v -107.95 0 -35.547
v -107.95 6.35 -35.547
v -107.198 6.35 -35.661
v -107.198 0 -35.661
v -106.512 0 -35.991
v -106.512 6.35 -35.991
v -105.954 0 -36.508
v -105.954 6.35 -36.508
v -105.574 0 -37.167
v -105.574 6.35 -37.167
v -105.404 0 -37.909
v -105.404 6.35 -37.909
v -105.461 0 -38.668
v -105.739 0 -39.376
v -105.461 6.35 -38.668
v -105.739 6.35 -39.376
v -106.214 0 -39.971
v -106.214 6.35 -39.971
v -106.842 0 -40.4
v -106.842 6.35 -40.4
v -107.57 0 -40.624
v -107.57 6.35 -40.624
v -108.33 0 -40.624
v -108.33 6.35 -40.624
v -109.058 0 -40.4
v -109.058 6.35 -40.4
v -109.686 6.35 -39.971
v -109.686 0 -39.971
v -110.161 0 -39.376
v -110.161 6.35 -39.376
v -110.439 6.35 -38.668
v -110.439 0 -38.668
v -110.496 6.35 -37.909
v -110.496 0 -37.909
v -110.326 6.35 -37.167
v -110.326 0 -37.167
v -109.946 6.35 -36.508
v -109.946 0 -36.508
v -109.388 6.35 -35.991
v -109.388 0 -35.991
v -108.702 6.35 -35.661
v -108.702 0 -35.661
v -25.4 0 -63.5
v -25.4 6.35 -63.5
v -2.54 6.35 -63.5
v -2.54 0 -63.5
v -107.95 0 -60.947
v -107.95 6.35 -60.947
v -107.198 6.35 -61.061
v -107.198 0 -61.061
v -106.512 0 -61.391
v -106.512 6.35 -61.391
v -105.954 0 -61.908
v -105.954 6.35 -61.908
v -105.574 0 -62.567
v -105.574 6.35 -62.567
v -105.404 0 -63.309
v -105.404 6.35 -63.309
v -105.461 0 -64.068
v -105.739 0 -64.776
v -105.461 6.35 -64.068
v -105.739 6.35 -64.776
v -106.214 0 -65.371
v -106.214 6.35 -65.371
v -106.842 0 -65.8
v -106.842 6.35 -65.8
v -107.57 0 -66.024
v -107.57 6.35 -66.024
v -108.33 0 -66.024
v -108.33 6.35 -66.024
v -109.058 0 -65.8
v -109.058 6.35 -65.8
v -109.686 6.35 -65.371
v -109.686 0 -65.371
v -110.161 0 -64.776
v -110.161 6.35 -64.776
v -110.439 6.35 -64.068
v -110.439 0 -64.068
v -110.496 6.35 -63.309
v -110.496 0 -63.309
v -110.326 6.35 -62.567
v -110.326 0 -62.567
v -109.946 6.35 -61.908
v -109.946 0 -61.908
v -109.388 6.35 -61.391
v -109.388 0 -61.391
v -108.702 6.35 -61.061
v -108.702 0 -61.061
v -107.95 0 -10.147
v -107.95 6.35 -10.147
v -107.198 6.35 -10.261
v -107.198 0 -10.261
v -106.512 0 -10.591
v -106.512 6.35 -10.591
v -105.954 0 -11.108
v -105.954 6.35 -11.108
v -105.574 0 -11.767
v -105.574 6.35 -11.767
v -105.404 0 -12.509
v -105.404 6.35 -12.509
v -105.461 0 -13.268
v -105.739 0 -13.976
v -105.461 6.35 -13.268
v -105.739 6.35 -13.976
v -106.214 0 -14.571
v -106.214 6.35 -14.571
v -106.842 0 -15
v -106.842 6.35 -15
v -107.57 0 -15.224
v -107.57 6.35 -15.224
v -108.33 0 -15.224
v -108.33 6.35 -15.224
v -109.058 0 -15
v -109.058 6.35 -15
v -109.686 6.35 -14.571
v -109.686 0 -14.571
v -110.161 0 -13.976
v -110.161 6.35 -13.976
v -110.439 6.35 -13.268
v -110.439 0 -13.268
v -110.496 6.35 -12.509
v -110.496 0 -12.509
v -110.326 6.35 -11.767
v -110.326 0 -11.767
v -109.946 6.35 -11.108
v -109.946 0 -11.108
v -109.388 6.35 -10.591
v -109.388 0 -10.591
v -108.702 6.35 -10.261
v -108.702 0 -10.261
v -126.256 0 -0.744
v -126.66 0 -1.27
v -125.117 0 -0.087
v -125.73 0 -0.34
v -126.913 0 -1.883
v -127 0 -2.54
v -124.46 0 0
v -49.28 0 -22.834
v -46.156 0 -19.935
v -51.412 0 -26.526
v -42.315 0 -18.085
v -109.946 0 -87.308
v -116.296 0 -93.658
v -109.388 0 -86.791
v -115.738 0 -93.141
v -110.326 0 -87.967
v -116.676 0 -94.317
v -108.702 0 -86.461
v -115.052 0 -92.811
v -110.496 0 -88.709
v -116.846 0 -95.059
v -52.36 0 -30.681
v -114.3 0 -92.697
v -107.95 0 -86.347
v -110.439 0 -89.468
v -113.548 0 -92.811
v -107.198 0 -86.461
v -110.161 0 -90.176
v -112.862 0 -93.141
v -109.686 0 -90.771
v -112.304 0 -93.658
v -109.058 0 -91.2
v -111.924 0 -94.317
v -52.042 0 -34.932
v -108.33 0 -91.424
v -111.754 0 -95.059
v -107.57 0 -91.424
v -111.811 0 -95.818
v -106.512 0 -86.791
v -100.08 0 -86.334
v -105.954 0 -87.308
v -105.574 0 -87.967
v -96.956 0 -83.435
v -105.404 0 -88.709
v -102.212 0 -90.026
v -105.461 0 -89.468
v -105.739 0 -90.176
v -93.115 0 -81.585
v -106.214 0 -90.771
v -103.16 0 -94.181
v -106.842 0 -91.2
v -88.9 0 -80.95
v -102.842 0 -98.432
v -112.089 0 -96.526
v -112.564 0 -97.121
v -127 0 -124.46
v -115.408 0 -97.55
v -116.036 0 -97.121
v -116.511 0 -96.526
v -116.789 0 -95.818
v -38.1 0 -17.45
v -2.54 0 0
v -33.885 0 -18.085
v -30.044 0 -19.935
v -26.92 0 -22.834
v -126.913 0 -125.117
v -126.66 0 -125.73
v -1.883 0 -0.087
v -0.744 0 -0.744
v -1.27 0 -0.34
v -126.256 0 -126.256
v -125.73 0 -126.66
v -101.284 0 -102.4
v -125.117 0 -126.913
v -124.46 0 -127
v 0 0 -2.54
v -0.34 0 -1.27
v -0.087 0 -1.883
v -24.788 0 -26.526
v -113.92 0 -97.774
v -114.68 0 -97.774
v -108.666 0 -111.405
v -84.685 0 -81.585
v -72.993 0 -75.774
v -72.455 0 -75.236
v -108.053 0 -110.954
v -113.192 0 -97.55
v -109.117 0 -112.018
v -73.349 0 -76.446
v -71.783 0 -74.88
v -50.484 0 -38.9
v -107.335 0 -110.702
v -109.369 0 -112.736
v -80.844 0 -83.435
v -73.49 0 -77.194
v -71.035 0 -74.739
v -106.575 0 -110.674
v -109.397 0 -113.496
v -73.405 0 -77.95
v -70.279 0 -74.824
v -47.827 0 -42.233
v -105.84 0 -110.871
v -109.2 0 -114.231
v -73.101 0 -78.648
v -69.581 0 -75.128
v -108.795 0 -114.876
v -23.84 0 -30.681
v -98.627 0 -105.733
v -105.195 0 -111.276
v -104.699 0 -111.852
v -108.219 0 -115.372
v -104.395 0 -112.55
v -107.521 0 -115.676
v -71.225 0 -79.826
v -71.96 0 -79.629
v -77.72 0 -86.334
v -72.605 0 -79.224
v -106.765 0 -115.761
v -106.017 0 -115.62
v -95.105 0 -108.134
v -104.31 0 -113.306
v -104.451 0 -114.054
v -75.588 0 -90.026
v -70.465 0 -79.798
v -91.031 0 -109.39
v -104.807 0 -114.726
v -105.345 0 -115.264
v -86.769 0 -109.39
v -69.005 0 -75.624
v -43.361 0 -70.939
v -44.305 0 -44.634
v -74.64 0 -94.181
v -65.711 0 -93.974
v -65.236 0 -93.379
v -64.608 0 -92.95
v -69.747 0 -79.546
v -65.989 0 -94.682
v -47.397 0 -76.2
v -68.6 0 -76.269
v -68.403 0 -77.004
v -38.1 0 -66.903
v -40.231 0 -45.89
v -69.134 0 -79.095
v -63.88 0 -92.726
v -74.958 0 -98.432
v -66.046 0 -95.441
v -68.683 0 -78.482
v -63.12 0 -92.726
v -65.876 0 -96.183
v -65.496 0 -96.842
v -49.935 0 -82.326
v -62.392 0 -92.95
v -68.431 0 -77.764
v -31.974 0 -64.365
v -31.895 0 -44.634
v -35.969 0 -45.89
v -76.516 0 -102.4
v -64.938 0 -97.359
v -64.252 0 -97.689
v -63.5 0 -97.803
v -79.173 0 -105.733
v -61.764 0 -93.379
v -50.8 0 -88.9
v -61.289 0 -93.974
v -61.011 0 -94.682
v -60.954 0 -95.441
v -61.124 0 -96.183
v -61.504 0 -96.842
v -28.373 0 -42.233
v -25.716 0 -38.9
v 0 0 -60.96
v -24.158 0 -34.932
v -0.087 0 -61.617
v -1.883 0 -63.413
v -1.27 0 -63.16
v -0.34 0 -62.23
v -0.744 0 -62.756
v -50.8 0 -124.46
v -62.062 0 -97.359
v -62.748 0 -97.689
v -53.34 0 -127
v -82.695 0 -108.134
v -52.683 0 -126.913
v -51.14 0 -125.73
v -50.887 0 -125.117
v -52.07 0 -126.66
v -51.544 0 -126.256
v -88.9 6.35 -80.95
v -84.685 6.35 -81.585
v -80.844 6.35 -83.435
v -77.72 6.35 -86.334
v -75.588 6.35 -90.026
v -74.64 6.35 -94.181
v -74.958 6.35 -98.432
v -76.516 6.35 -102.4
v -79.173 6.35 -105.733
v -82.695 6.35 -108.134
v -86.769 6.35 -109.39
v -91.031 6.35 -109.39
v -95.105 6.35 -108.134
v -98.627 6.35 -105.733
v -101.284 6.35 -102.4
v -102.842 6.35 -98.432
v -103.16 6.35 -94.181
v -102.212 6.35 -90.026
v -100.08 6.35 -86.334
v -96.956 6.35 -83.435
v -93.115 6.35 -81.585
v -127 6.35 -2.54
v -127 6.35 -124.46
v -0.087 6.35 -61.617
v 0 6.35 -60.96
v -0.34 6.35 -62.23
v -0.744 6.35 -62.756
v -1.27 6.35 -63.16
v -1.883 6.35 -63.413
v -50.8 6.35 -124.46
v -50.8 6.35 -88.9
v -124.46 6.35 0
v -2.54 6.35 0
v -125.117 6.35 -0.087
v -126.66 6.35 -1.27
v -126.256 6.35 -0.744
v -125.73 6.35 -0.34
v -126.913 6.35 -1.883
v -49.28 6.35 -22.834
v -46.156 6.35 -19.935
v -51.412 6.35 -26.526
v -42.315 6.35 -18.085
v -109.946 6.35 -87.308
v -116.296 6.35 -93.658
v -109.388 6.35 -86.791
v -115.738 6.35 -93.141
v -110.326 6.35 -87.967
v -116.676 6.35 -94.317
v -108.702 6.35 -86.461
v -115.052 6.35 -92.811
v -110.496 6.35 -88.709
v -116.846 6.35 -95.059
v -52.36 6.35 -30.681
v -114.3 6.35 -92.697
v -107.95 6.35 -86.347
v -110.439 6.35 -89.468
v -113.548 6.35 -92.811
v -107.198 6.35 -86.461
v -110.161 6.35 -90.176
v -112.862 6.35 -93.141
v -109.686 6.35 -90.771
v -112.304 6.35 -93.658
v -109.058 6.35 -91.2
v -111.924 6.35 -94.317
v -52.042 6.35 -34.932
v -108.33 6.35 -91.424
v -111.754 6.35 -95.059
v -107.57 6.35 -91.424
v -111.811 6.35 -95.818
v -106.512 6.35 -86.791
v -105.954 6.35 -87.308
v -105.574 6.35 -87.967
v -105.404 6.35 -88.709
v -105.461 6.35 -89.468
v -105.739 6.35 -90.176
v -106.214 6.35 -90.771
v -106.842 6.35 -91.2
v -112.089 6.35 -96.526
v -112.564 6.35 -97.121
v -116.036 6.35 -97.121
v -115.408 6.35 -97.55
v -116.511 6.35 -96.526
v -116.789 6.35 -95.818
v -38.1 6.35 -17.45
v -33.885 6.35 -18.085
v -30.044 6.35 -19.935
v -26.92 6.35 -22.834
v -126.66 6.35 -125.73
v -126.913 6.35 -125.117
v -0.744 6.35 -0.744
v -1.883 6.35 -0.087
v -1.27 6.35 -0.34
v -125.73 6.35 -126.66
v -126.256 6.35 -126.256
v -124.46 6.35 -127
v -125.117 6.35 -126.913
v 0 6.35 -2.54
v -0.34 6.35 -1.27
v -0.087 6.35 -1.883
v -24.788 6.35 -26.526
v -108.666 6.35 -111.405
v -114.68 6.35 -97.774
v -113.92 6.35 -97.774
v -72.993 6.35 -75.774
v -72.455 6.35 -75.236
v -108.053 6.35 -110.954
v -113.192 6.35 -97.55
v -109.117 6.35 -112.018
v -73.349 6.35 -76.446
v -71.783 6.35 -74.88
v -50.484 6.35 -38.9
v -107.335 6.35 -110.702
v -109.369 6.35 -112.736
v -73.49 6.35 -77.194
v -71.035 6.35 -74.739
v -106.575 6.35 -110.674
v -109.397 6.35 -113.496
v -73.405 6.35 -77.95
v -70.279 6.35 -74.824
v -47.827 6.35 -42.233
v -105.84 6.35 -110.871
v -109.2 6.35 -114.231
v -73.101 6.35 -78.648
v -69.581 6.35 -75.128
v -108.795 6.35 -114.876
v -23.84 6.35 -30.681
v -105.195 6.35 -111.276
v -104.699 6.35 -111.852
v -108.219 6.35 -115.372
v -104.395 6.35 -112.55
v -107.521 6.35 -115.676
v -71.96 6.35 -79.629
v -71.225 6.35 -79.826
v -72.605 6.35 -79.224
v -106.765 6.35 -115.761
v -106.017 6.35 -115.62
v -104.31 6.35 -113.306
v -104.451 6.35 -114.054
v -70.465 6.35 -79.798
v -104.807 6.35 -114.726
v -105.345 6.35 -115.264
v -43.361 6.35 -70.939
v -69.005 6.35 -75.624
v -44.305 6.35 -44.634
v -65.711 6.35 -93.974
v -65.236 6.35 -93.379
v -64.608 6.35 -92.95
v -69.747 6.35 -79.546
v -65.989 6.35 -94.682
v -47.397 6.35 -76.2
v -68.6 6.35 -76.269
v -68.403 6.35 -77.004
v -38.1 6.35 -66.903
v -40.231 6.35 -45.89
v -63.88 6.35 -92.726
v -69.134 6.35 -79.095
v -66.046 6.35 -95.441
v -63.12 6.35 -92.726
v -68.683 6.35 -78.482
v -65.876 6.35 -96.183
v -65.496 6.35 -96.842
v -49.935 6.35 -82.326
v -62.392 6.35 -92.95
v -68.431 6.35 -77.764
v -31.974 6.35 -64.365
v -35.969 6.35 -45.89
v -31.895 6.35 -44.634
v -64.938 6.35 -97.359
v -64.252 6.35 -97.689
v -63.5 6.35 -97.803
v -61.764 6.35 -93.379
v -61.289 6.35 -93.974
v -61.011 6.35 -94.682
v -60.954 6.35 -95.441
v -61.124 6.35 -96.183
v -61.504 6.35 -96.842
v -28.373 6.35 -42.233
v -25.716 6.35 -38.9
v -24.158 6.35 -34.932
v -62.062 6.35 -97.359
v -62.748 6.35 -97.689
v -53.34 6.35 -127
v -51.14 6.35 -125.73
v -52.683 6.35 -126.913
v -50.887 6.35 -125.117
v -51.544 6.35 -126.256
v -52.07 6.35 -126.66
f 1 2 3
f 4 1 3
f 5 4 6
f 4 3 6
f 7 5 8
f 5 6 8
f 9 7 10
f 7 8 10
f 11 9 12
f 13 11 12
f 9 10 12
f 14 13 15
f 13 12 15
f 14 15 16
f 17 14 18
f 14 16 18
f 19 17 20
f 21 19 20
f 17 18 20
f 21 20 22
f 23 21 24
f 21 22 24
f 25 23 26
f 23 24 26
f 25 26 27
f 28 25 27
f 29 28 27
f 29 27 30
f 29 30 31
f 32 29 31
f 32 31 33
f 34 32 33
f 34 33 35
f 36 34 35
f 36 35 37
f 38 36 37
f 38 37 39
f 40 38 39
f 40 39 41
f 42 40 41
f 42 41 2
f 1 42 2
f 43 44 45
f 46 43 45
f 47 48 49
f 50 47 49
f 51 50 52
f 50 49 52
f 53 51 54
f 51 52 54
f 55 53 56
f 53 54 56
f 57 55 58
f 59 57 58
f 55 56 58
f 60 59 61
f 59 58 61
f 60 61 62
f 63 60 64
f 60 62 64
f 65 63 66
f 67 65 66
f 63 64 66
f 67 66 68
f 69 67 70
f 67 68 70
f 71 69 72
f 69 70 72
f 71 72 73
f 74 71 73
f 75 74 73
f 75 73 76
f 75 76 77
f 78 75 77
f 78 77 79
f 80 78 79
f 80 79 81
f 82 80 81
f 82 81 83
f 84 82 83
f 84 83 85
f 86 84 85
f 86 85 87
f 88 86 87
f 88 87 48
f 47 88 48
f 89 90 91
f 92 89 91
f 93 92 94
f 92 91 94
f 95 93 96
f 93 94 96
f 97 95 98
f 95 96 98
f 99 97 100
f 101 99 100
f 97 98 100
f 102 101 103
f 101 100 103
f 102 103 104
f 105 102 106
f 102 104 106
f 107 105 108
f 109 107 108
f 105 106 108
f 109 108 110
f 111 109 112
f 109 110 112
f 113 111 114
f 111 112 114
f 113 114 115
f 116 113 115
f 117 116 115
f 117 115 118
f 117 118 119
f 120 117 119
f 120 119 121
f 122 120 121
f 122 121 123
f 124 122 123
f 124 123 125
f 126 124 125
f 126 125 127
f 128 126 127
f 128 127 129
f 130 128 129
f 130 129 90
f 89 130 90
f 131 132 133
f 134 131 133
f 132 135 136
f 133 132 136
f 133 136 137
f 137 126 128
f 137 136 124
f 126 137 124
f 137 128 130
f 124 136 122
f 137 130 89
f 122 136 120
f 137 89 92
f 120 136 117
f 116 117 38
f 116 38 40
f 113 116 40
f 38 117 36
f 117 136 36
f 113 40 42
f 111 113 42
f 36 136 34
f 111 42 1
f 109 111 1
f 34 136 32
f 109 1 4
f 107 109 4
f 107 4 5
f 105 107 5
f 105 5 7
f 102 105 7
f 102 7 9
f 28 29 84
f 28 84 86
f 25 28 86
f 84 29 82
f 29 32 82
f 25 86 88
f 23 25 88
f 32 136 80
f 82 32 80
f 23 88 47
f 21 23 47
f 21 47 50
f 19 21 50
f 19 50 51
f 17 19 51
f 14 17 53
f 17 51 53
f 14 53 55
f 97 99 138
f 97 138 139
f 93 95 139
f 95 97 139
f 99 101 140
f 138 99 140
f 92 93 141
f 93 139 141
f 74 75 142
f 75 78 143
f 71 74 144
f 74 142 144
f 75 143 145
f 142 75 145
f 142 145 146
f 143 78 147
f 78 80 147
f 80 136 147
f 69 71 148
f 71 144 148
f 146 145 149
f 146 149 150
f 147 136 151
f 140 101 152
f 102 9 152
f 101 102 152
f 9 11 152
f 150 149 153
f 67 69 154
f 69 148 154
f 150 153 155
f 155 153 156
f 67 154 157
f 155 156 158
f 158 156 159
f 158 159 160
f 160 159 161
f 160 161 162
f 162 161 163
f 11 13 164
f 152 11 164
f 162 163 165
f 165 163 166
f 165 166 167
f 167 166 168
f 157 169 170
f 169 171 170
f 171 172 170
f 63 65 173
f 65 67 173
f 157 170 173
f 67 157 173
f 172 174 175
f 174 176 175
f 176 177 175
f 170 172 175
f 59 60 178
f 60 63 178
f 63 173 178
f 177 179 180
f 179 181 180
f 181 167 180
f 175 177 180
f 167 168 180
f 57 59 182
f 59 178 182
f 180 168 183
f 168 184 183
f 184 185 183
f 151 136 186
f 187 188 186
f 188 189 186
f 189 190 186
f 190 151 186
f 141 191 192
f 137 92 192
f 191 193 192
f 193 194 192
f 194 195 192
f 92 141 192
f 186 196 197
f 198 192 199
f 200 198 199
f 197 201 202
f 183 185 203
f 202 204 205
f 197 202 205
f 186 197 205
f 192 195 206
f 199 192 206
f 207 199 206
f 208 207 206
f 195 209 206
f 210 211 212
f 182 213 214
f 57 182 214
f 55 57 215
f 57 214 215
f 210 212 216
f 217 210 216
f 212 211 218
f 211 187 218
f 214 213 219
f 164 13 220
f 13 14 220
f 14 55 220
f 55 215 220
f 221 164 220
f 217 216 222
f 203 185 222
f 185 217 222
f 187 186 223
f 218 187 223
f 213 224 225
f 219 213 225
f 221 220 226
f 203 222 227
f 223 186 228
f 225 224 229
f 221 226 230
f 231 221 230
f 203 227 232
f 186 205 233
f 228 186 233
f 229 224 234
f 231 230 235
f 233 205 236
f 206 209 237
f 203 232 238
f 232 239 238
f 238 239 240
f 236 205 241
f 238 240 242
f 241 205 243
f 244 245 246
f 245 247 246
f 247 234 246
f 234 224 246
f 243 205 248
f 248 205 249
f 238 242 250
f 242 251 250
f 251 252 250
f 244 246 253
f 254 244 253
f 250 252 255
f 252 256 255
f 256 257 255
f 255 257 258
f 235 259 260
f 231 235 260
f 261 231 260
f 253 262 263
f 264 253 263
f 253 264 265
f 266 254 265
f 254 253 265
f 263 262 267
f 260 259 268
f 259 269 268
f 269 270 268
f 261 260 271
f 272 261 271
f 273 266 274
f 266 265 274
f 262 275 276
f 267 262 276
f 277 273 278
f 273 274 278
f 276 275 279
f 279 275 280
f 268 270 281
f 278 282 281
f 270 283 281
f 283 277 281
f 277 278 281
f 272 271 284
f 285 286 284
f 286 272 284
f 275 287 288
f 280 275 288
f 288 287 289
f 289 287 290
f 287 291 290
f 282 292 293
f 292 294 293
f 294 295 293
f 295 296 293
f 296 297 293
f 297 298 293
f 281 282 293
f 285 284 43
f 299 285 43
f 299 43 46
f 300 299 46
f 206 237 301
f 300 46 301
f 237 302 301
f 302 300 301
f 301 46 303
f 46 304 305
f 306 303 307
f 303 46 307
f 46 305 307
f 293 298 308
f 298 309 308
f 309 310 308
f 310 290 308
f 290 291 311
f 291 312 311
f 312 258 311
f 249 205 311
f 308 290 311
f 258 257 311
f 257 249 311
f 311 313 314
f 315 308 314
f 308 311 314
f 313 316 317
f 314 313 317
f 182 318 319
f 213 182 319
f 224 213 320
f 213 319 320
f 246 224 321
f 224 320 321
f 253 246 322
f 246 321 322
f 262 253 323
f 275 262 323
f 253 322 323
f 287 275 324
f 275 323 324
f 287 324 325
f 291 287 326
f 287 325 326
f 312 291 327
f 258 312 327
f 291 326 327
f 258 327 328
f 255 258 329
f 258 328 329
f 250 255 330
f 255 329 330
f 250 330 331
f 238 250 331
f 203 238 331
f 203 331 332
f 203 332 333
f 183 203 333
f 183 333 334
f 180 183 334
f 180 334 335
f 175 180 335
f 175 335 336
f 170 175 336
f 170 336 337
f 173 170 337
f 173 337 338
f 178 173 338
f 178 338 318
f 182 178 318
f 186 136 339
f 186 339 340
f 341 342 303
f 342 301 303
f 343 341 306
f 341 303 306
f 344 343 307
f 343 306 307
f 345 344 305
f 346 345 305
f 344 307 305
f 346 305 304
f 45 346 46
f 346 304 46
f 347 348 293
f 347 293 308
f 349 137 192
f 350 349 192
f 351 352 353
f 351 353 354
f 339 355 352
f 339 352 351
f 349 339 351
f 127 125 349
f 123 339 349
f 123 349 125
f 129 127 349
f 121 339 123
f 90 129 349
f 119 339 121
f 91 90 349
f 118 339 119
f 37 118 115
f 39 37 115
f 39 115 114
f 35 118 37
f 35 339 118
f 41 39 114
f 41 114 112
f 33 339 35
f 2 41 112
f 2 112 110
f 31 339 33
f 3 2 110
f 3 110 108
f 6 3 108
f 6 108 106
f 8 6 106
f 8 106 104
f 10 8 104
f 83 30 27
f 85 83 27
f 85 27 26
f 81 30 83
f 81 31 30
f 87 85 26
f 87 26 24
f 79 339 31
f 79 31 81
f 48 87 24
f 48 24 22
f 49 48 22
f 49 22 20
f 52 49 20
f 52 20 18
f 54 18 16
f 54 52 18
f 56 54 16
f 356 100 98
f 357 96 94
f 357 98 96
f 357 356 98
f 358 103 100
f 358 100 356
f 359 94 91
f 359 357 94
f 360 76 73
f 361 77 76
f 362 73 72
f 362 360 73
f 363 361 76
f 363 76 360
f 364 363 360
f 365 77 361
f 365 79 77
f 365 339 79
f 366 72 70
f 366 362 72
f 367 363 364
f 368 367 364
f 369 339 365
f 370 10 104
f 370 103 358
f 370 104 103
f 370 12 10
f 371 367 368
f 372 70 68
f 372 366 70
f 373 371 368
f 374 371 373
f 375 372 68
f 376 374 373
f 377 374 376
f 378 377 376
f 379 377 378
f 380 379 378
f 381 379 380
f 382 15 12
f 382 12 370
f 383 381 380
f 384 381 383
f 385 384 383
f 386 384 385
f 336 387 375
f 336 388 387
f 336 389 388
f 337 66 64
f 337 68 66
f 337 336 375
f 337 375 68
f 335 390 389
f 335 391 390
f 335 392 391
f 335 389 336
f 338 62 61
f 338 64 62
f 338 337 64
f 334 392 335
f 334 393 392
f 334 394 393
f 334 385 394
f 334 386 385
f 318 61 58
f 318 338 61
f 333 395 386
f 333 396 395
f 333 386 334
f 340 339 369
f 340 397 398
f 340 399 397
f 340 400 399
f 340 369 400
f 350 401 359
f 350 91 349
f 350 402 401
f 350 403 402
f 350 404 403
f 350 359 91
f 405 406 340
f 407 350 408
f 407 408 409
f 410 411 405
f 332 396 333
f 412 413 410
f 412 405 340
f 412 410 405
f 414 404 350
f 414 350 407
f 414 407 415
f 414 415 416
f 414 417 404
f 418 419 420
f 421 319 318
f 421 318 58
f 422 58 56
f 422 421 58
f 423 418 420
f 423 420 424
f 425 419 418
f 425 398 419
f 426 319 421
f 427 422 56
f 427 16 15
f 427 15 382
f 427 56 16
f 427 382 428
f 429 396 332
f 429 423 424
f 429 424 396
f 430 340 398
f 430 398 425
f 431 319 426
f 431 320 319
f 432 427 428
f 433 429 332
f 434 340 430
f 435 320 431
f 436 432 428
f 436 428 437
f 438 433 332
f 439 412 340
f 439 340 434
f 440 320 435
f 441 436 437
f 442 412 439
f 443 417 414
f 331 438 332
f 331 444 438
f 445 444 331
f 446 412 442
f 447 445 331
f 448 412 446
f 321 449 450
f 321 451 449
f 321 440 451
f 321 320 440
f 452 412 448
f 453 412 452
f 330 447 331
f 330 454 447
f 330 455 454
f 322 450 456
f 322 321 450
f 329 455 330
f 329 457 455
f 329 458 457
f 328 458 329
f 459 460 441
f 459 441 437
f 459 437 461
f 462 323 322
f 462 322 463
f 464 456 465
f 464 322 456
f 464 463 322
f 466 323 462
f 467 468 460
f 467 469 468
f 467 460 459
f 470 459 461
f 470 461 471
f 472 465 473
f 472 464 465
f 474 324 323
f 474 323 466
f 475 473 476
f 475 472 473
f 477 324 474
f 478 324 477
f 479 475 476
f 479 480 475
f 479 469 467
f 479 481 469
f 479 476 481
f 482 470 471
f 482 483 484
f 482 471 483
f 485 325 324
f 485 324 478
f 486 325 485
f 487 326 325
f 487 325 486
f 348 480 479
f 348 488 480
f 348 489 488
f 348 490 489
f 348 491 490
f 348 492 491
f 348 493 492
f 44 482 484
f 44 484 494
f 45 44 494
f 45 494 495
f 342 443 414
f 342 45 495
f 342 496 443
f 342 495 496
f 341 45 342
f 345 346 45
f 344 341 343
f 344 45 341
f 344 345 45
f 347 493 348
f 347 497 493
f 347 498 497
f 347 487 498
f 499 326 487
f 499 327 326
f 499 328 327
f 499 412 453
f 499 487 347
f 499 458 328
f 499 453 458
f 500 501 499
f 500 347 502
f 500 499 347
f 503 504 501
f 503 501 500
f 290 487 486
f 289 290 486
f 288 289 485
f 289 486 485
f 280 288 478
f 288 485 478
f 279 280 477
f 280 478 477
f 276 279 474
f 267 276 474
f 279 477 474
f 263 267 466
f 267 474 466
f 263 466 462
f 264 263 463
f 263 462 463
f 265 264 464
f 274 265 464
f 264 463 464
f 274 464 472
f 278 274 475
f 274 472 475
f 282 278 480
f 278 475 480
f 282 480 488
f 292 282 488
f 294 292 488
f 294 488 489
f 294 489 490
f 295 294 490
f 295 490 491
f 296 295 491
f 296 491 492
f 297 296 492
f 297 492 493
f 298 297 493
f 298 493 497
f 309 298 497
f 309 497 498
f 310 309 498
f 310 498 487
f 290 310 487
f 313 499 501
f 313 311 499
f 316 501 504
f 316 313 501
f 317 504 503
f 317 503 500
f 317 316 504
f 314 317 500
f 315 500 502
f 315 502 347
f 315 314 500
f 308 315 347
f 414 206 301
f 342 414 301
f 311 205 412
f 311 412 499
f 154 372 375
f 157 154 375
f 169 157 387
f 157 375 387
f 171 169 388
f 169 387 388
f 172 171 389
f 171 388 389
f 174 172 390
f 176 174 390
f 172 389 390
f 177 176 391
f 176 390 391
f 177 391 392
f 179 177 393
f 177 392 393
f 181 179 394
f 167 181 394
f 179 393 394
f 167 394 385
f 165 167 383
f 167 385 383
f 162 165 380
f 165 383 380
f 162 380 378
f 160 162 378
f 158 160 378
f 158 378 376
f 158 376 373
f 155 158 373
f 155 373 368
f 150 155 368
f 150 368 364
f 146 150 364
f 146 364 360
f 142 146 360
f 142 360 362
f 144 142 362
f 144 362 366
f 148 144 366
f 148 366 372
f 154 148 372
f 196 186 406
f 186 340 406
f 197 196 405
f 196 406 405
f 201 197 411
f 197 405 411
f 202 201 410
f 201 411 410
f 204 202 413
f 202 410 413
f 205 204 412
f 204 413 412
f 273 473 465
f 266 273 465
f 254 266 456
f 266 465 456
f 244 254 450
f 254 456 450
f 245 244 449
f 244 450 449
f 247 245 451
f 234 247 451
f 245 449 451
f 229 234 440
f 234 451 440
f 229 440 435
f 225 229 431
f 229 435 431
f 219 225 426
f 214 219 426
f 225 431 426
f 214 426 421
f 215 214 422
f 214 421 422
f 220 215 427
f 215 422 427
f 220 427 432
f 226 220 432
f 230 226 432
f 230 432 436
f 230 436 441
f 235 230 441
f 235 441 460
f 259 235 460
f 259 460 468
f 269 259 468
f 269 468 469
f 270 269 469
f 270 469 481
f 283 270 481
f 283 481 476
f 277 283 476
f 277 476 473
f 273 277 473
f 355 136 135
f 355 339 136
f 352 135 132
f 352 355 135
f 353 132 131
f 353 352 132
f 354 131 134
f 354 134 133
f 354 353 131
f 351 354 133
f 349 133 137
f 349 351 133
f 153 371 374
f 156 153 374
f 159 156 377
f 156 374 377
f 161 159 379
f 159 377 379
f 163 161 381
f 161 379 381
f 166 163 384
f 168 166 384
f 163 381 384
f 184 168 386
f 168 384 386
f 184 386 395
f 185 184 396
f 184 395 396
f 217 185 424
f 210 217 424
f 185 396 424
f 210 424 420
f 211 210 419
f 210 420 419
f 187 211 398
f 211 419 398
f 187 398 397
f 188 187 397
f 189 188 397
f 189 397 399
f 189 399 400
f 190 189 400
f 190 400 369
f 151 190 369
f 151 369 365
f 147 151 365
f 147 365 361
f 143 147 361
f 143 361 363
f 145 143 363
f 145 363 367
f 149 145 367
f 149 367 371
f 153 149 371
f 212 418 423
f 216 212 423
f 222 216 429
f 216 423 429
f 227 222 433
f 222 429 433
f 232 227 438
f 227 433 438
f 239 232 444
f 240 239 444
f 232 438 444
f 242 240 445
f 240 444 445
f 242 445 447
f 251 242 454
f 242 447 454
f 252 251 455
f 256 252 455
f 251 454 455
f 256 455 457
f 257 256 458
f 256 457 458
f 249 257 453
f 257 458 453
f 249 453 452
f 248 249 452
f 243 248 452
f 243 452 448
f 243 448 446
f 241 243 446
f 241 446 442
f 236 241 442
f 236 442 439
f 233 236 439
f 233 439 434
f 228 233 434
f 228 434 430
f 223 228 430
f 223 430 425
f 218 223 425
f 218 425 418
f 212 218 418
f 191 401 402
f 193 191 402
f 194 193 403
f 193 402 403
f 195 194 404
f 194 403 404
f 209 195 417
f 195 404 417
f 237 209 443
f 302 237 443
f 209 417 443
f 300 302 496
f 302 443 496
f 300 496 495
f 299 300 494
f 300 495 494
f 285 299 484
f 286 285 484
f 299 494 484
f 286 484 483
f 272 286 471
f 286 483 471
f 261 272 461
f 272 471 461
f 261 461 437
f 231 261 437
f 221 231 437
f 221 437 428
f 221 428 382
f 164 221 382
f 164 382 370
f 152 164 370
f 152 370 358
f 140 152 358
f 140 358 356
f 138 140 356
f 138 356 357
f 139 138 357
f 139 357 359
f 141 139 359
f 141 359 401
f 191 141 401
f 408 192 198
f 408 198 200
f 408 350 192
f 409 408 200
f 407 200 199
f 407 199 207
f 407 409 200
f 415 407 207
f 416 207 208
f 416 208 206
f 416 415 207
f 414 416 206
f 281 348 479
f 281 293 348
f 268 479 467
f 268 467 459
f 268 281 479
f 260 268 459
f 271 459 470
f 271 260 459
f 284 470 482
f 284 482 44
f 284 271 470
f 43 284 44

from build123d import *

# Parameters (mm, degrees)
SKETCH1_W           = 127
SKETCH1_H           = 127
BOSS_EXTRUDE1_DEPTH = 6.35
SKETCH2_W           = 50.8
SKETCH2_H           = 63.5
CUT_EXTRUDE1_DEPTH  = 180.717340566
SKETCH3_R           = 14.3002
CUT_EXTRUDE2_DEPTH  = 180.717340566
SKETCH5_R           = 2.5527
CUT_EXTRUDE4_DEPTH  = 180.717340566
CIRPATTERN1_COUNT   = 8
SKETCH6_R           = 14.3002
CUT_EXTRUDE5_DEPTH  = 180.717340566
FILLET1_R           = 2.54
FILLET2_R           = 25.4
SKETCH10_R          = 2.5527
CUT_EXTRUDE7_DEPTH  = 180.717340566
LPATTERN1_COUNT     = 5
LPATTERN1_PITCH     = 25.4


with BuildPart() as part:
    # Sketch1 → Boss-Extrude1 (new body)
    with BuildSketch(Plane(origin=(0, 0, 0), x_dir=(1, 0, 0), z_dir=(0, 1, 0))):
        with Locations((-63.5, 63.5)):
            Rectangle(SKETCH1_W, SKETCH1_H)
    extrude(amount=BOSS_EXTRUDE1_DEPTH)

    # Sketch2 → Cut-Extrude1 (cut, through all)
    with BuildSketch(Plane(origin=(0, 6.35, 0), x_dir=(1, 0, 0), z_dir=(0, 1, 0))):
        with Locations((-25.4, 95.25)):
            Rectangle(SKETCH2_W, SKETCH2_H)
    extrude(amount=-CUT_EXTRUDE1_DEPTH, mode=Mode.SUBTRACT)

    # Sketch3 → Cut-Extrude2 (cut, through all)
    with BuildSketch(Plane(origin=(0, 6.35, 0), x_dir=(1, 0, 0), z_dir=(0, 1, 0))):
        with Locations((-38.1, 31.75)):
            Circle(SKETCH3_R)
    extrude(amount=-CUT_EXTRUDE2_DEPTH, mode=Mode.SUBTRACT)

    # Sketch5 → Cut-Extrude4 (cut, through all)
    with BuildSketch(Plane(origin=(0, 6.35, 0), x_dir=(1, 0, 0), z_dir=(0, 1, 0))):
        with Locations((-114.3, 95.25)):
            Circle(SKETCH5_R)
    cut_extrude4 = extrude(amount=-CUT_EXTRUDE4_DEPTH, mode=Mode.SUBTRACT)

    # CirPattern1: Cut-Extrude4 ×8 about axis, 4 skipped
    cirpattern1_axis = Axis((-88.9, 6.35, -95.25), (0, 1, 0))
    add([cut_extrude4.rotate(cirpattern1_axis, i * 360 / CIRPATTERN1_COUNT) for i in range(1, CIRPATTERN1_COUNT) if i not in (1, 2, 5, 6)], mode=Mode.SUBTRACT)

    # Sketch6 → Cut-Extrude5 (cut, through all)
    with BuildSketch(Plane(origin=(0, 6.35, 0), x_dir=(1, 0, 0), z_dir=(0, 1, 0))):
        with Locations((-88.9, 95.25)):
            Circle(SKETCH6_R)
    extrude(amount=-CUT_EXTRUDE5_DEPTH, mode=Mode.SUBTRACT)

    # Fillet1
    fillet1_edges = [part.edges().sort_by_distance(p)[0] for p in [
        (-127, 3.175, 0),
        (0, 3.175, 0),
        (0, 3.175, -63.5),
        (-50.8, 3.175, -127),
        (-127, 3.175, -127),
    ]]
    fillet(fillet1_edges, radius=FILLET1_R)

    # Fillet2
    fillet2_edges = [part.edges().sort_by_distance(p)[0] for p in [
        (-50.8, 3.175, -63.5),
    ]]
    fillet(fillet2_edges, radius=FILLET2_R)

    # Sketch10 → Cut-Extrude7 (cut, through all)
    with BuildSketch(Plane(origin=(0, 6.35, 0), x_dir=(1, 0, 0), z_dir=(0, 1, 0))):
        with Locations((-107.95, 12.7)):
            Circle(SKETCH10_R)
    cut_extrude7 = extrude(amount=-CUT_EXTRUDE7_DEPTH, mode=Mode.SUBTRACT)

    # LPattern1: Cut-Extrude7 ×5, 1 skipped
    with Locations(*[(0, 0, -i * LPATTERN1_PITCH) for i in range(1, LPATTERN1_COUNT) if i not in (4,)]):
        add(cut_extrude7, mode=Mode.SUBTRACT)


solid = part.part
